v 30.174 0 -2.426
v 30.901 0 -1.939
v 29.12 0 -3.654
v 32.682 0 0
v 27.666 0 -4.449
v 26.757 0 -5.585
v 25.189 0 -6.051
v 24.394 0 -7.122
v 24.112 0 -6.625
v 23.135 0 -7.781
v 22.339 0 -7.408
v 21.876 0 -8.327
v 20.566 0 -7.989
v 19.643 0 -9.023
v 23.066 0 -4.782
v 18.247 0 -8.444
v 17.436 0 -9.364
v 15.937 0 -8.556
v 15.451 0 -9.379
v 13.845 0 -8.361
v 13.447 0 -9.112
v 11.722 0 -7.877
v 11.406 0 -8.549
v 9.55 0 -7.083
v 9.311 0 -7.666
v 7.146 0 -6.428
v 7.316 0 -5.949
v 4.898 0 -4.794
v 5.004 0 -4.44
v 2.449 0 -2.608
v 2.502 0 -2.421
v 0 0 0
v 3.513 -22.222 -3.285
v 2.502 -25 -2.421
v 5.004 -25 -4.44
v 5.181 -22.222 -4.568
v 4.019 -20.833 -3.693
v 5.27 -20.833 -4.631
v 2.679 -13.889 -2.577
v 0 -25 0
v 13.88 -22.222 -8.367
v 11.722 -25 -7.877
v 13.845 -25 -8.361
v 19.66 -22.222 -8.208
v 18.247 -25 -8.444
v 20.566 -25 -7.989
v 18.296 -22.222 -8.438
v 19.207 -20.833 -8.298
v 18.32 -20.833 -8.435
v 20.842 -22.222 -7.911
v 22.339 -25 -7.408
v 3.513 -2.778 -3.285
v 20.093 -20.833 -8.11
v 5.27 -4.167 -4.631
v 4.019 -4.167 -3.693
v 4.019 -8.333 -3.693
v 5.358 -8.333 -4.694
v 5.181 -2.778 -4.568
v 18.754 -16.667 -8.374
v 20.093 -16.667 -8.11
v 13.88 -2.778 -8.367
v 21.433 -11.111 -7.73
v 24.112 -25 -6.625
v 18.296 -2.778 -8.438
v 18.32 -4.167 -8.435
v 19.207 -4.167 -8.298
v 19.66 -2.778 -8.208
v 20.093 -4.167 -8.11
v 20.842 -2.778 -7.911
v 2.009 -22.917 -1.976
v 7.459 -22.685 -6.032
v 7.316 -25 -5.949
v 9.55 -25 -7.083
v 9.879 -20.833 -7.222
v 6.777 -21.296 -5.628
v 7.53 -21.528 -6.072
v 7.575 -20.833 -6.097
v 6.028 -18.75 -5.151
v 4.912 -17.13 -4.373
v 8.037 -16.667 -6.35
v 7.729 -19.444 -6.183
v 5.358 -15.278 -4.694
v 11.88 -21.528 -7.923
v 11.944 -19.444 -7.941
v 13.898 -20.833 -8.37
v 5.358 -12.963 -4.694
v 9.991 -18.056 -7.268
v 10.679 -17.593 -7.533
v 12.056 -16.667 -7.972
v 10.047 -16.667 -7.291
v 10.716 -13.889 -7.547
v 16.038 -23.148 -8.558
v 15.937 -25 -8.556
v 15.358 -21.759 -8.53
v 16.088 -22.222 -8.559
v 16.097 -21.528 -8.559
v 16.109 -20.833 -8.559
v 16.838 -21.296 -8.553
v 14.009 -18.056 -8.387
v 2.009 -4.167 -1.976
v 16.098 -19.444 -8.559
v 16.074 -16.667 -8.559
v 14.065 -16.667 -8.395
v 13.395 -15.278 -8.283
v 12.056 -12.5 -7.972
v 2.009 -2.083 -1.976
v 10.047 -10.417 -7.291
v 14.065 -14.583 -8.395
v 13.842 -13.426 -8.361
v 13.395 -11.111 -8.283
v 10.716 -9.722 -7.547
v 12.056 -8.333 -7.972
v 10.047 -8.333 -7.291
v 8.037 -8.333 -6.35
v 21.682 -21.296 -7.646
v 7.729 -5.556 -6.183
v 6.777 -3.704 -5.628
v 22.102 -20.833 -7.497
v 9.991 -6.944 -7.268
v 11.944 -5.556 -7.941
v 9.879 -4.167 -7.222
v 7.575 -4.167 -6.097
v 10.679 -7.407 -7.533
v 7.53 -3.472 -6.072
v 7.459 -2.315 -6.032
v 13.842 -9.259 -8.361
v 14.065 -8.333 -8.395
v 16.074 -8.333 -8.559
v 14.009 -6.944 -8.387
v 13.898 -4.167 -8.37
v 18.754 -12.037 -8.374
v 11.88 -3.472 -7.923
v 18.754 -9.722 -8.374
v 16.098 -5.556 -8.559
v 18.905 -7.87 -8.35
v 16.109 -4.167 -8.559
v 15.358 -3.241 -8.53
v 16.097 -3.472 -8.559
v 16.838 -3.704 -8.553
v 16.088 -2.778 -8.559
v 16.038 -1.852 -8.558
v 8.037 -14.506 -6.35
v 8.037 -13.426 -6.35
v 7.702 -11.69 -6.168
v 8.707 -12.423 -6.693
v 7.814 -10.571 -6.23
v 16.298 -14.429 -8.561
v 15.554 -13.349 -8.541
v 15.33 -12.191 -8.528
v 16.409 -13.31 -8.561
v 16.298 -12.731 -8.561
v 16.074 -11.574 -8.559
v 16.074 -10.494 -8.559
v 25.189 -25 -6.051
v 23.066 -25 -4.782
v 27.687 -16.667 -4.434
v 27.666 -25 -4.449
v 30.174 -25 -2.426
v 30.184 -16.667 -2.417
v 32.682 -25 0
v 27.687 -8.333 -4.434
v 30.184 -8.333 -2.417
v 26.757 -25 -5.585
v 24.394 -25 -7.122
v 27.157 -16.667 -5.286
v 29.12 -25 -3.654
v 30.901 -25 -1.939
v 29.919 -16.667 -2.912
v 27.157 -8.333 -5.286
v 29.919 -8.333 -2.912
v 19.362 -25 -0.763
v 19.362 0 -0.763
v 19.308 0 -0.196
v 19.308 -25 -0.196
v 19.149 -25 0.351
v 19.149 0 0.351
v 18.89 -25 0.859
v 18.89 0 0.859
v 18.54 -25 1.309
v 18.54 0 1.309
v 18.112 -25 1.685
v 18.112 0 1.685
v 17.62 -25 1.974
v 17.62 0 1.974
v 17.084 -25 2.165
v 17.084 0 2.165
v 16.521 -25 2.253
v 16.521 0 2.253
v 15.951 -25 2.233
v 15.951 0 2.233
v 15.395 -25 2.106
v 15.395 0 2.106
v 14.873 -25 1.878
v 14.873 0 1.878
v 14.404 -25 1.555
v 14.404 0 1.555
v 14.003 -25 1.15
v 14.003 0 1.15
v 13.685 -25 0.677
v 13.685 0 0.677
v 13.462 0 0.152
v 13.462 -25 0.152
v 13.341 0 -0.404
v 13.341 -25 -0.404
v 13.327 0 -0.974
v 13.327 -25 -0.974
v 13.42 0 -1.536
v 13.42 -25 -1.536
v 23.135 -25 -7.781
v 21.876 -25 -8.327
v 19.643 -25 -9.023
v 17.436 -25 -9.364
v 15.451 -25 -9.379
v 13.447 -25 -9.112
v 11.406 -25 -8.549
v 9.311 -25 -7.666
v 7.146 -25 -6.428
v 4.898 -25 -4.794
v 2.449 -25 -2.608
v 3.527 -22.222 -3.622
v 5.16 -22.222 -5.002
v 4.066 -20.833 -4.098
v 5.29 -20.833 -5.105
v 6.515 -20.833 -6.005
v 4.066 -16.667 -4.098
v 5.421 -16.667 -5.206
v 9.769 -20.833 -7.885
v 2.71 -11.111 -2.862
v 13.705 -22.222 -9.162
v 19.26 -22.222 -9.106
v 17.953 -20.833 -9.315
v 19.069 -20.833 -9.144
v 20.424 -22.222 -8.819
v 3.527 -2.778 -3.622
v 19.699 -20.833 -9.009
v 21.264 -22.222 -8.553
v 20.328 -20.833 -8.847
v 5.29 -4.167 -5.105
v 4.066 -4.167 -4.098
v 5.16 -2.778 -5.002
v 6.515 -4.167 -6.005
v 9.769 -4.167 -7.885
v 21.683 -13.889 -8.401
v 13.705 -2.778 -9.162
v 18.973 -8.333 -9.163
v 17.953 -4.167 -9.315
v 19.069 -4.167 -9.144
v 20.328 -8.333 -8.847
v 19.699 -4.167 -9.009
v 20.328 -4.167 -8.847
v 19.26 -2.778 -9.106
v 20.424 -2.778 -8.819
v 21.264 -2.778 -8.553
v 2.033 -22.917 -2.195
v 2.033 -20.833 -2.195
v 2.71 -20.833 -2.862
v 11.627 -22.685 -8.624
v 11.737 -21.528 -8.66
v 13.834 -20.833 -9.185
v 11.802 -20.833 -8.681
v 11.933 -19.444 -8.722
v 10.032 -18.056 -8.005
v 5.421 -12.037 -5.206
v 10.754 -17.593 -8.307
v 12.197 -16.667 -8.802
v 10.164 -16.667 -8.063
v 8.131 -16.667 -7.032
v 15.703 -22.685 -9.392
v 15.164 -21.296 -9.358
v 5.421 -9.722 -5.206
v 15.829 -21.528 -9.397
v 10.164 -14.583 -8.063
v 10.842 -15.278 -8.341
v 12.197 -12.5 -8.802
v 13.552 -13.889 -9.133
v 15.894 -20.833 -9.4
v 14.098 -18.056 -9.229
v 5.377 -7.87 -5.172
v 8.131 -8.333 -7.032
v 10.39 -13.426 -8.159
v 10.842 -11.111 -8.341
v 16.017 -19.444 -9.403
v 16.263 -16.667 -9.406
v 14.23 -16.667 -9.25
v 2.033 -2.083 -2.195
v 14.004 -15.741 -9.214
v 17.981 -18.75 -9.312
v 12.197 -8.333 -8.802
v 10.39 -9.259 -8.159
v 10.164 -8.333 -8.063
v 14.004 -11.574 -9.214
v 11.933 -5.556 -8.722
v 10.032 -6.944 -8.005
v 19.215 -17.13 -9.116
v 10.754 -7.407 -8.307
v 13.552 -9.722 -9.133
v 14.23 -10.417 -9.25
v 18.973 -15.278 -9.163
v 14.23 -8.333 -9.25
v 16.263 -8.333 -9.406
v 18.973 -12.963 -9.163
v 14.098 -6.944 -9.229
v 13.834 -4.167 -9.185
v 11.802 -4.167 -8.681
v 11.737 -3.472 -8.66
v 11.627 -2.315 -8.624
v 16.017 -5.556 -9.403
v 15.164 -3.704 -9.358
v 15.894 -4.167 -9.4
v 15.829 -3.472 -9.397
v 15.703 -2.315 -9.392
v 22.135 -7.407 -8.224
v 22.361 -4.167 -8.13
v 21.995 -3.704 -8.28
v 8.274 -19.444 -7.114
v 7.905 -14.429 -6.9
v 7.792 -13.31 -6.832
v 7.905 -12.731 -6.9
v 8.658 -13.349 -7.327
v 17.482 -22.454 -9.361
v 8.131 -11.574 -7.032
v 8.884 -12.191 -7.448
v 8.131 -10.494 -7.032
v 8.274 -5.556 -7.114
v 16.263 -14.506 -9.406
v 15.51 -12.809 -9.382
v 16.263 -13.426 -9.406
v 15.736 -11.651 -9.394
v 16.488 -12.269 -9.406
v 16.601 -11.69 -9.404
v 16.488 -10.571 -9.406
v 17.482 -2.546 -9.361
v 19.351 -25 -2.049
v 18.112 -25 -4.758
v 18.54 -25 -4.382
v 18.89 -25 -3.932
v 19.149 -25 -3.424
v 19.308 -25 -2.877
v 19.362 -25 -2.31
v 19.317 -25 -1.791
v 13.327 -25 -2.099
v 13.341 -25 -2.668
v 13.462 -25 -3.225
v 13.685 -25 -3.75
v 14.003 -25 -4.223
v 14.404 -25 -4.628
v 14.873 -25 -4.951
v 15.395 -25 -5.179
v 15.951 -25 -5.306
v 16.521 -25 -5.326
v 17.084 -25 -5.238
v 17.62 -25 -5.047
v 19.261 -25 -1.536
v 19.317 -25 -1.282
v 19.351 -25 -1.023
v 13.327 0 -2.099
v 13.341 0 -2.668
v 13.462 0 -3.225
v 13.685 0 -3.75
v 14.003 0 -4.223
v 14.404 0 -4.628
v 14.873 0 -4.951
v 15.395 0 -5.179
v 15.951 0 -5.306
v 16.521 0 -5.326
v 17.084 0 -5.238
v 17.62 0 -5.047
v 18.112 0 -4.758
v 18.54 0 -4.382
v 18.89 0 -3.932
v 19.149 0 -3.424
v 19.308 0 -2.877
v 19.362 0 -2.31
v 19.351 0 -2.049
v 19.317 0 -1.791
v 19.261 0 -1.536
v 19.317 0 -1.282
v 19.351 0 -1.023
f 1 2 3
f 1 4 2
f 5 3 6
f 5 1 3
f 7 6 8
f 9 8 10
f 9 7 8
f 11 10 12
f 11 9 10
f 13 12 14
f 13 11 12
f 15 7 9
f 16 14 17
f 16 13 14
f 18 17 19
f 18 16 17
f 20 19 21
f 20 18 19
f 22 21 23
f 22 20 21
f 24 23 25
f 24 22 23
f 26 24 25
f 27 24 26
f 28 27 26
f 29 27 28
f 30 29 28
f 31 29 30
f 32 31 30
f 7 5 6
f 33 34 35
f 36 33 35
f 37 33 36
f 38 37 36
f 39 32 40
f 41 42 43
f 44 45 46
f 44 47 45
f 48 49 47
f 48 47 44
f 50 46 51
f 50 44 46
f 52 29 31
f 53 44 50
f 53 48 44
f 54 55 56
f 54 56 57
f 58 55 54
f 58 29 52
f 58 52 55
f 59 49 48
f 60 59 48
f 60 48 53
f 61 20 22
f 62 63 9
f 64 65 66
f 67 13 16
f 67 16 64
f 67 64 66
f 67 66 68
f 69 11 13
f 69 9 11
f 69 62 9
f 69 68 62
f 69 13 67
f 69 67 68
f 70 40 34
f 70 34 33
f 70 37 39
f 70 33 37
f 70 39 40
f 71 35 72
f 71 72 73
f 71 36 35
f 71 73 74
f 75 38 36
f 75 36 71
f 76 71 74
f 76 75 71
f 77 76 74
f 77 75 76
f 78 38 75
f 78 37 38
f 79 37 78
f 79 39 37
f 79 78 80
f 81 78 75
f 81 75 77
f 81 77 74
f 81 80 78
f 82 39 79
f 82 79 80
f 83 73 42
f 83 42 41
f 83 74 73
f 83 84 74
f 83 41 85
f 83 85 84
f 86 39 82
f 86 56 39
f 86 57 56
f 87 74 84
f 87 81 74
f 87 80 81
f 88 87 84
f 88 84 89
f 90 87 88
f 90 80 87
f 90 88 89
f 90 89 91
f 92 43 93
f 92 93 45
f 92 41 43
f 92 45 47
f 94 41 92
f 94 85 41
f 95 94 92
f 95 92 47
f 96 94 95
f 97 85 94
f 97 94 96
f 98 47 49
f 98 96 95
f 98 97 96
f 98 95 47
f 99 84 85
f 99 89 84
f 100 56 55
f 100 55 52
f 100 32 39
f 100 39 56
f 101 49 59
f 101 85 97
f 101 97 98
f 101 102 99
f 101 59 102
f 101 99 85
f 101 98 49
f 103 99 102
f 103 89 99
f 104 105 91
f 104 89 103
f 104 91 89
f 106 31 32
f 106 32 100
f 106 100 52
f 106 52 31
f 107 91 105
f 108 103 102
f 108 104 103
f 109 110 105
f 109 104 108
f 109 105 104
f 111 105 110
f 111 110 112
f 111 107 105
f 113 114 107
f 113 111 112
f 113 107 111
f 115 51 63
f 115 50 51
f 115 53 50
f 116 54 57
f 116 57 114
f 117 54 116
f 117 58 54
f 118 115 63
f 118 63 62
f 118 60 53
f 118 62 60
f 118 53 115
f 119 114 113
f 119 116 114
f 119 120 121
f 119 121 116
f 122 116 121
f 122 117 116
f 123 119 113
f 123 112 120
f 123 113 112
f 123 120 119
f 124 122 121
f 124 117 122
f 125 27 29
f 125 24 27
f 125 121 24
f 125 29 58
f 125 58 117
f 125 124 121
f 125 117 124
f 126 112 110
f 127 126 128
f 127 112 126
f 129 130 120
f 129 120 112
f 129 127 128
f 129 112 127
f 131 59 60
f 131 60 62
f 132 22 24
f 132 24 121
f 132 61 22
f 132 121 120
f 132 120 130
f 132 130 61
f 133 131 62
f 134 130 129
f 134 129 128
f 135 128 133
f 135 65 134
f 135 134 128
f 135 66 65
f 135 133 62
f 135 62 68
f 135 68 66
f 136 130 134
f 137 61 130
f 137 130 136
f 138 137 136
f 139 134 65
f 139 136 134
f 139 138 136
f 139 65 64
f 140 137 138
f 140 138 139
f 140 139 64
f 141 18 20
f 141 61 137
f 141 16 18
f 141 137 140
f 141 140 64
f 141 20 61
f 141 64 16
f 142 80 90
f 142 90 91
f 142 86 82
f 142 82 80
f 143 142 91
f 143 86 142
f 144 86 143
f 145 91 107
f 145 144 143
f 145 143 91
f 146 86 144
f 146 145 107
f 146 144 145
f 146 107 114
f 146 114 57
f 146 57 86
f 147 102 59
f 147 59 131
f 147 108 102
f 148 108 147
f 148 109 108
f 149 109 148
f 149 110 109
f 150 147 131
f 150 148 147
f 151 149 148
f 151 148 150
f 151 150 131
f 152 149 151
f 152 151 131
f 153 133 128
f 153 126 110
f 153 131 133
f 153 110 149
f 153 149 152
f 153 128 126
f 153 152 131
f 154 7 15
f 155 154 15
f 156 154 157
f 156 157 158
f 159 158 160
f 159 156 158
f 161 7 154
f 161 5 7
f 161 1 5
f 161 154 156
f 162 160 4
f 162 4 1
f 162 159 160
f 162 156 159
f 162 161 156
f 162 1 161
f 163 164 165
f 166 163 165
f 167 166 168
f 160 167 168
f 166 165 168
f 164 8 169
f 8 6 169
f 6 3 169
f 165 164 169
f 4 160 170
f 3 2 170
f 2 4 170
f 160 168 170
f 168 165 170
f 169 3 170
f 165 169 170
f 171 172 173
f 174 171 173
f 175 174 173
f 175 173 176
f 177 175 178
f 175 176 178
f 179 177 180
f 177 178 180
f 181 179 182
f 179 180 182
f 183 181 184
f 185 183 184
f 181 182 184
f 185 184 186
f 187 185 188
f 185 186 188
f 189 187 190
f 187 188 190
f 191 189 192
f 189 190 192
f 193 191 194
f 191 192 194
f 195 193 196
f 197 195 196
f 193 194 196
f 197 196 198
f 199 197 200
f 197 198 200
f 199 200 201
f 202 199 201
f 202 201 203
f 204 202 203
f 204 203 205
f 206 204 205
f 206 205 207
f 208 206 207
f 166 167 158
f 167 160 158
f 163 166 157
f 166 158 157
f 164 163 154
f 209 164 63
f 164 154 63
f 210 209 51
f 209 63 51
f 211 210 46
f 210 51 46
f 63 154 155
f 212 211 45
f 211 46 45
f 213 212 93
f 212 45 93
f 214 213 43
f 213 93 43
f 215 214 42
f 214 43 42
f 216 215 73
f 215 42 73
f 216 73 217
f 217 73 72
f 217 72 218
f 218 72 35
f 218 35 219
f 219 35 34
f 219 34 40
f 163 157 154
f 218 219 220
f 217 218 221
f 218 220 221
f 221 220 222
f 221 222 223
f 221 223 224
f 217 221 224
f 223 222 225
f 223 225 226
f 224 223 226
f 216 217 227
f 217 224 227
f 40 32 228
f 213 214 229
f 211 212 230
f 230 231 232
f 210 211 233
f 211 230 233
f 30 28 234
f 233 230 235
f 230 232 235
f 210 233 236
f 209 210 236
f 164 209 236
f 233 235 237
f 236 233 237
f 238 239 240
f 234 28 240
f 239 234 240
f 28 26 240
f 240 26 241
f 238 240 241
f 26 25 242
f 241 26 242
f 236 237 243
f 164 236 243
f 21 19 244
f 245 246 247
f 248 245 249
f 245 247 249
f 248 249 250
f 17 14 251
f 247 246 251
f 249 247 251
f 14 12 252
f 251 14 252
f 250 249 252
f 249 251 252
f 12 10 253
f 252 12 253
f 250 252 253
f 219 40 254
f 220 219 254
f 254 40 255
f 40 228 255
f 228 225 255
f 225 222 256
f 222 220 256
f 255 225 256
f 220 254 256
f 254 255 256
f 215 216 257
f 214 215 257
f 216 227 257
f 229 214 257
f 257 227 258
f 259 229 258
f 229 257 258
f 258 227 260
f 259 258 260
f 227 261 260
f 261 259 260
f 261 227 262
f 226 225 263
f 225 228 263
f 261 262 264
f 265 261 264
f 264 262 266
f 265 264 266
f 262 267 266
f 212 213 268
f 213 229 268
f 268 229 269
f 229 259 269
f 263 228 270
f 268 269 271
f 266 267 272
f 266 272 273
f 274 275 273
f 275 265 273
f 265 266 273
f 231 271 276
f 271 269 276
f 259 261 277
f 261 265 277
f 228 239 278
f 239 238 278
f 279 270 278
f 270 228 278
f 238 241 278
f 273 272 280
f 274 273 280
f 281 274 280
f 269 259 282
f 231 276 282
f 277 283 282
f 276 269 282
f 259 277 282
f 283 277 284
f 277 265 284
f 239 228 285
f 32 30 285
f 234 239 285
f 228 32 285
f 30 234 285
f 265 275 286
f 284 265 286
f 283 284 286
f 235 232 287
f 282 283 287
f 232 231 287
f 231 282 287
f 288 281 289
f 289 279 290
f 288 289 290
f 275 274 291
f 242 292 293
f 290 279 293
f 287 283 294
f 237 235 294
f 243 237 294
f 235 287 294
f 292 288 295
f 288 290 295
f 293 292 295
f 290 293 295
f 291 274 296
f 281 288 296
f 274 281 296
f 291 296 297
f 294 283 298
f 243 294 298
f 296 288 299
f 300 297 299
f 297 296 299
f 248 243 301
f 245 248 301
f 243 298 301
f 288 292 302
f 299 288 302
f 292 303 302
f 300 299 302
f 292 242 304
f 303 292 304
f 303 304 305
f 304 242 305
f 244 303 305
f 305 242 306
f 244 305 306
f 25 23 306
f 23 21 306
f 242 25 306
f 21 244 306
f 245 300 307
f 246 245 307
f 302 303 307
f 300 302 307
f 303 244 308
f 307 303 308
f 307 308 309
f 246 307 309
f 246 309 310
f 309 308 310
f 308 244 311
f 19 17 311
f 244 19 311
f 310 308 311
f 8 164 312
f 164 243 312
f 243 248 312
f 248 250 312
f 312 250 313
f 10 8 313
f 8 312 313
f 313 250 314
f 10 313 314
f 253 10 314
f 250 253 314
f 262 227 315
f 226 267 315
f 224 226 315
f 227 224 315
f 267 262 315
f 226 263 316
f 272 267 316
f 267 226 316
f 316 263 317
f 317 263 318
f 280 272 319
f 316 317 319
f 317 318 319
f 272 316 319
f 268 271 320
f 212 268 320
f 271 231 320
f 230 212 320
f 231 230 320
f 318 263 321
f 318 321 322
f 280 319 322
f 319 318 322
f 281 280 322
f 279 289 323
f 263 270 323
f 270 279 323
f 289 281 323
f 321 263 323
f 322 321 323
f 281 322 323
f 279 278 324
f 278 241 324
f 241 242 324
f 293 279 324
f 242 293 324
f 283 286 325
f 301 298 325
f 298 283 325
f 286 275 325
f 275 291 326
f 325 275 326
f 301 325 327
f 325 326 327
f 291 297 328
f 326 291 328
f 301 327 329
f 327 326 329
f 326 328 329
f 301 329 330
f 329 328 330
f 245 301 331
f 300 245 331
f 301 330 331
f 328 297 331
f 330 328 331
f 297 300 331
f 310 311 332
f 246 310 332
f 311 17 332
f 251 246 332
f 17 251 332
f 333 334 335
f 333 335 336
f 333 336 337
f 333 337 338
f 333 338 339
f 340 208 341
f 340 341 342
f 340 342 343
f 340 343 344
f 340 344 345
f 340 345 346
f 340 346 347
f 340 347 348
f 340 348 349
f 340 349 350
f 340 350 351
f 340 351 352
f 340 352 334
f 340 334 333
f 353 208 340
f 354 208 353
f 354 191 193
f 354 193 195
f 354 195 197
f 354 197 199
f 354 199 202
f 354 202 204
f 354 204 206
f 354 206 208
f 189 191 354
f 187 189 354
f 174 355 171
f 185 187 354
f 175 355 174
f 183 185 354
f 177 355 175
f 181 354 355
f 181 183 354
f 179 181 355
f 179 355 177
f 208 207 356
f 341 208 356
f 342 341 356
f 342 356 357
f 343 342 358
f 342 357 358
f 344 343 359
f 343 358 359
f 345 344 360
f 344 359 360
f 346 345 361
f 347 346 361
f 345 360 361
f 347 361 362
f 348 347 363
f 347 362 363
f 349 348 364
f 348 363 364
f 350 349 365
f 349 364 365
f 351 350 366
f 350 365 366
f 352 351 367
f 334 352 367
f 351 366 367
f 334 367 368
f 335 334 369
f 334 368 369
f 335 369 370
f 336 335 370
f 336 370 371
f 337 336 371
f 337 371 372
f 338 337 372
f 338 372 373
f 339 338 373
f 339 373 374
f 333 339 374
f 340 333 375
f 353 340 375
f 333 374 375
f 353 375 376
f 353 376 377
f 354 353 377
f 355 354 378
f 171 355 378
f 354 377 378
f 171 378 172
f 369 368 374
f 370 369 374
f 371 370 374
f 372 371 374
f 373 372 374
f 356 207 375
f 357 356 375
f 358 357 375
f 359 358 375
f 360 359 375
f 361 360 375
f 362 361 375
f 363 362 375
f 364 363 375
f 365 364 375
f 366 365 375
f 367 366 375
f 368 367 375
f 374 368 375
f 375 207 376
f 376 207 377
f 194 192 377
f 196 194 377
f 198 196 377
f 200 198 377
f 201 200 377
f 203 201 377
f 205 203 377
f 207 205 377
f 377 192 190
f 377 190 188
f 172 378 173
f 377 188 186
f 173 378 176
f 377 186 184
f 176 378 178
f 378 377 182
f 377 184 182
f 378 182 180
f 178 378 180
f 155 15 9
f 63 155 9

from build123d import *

# Parameters (mm, degrees)
F1_DEPTH = 25


with BuildPart() as f1:
    # F0 (on Front) → F1 (new body)
    with BuildSketch(Plane.XZ):
        with BuildLine():
            add(Edge.make_bspline(
                [(25.1893661916, -6.0507666302), (27.6868790121, -4.6337748478), (30.1843918325, -2.6168526378), (32.681904653, 0)],
                knots=[25.1893661916, 25.1893661916, 25.1893661916, 25.1893661916, 32.681904653, 32.681904653, 32.681904653, 32.681904653], degree=3))
            add(Edge.make_bspline(
                [(24.1117389364, -6.6249397749), (24.4709480215, -6.4459589633), (24.8301571066, -6.2545679151), (25.1893661916, -6.0507666302)],
                knots=[24.1117389364, 24.1117389364, 24.1117389364, 24.1117389364, 25.1893661916, 25.1893661916, 25.1893661916, 25.1893661916], degree=3))
            Line((24.1117389364, -6.6249397749), (24.3938389779, -7.1221539996))
            add(Edge.make_bspline(
                [(24.3938389779, -7.1221539996), (27.1565275363, -5.5547118017), (29.9192160946, -3.1806604685), (32.681904653, 0)],
                knots=[24.3938389779, 24.3938389779, 24.3938389779, 24.3938389779, 32.681904653, 32.681904653, 32.681904653, 32.681904653], degree=3))
        make_face()
        with BuildLine():
            add(Edge.make_bspline(
                [(24.1117389364, -6.6249397749), (24.4709480215, -6.4459589633), (24.8301571066, -6.2545679151), (25.1893661916, -6.0507666302)],
                knots=[24.1117389364, 24.1117389364, 24.1117389364, 24.1117389364, 25.1893661916, 25.1893661916, 25.1893661916, 25.1893661916], degree=3))
            Line((25.1893661916, -6.0507666302), (23.066070649, -4.7819015963))
            Line((23.066070649, -4.7819015963), (24.1117389364, -6.6249397749))
        make_face()
        with BuildLine():
            Line((24.3938389779, -7.1221539996), (24.1117389364, -6.6249397749))
            add(Edge.make_bspline(
                [(0, 0), (8.0372463121, -8.4212937928), (16.0744926243, -10.6296070511), (24.1117389364, -6.6249397749)],
                knots=[0, 0, 0, 0, 24.1117389364, 24.1117389364, 24.1117389364, 24.1117389364], degree=3))
            add(Edge.make_bspline(
                [(0, 0), (8.1312796593, -9.3614749635), (16.2625593186, -11.7355262967), (24.3938389779, -7.1221539996)],
                knots=[0, 0, 0, 0, 24.3938389779, 24.3938389779, 24.3938389779, 24.3938389779], degree=3))
        make_face()
    extrude(amount=F1_DEPTH)


with BuildPart() as f1b:
    # F0 (on Front) → F1, piece 2 (new body)
    with BuildSketch(Plane.XZ):
        with BuildLine():
            ThreePointArc((19.2614262365, -1.5364169219), (19.3368225108, -1.1529820089), (19.3620955482, -0.7630227747))
            ThreePointArc((19.3620955482, -0.7630227747), (15.9509930924, 2.2328474096), (13.4204784165, -1.5364169219))
            ThreePointArc((13.4204784165, -1.5364169219), (16.3409523265, 0.7113321526), (19.2614262365, -1.5364169219))
        make_face()
        with BuildLine():
            ThreePointArc((19.2614262365, -1.5364169219), (16.3409523265, 0.7113321526), (13.4204784165, -1.5364169219))
            ThreePointArc((13.4204784165, -1.5364169219), (16.3409523265, -3.7841659964), (19.2614262365, -1.5364169219))
        make_face()
        with BuildLine():
            ThreePointArc((19.2614262365, -1.5364169219), (16.3409523265, -3.7841659964), (13.4204784165, -1.5364169219))
            ThreePointArc((13.4204784165, -1.5364169219), (15.9509930924, -5.3056812534), (19.3620955482, -2.3098110691))
            ThreePointArc((19.3620955482, -2.3098110691), (19.3368225108, -1.9198518349), (19.2614262365, -1.5364169219))
        make_face()
    extrude(amount=F1_DEPTH)


solid = Compound([f1.part, f1b.part])
